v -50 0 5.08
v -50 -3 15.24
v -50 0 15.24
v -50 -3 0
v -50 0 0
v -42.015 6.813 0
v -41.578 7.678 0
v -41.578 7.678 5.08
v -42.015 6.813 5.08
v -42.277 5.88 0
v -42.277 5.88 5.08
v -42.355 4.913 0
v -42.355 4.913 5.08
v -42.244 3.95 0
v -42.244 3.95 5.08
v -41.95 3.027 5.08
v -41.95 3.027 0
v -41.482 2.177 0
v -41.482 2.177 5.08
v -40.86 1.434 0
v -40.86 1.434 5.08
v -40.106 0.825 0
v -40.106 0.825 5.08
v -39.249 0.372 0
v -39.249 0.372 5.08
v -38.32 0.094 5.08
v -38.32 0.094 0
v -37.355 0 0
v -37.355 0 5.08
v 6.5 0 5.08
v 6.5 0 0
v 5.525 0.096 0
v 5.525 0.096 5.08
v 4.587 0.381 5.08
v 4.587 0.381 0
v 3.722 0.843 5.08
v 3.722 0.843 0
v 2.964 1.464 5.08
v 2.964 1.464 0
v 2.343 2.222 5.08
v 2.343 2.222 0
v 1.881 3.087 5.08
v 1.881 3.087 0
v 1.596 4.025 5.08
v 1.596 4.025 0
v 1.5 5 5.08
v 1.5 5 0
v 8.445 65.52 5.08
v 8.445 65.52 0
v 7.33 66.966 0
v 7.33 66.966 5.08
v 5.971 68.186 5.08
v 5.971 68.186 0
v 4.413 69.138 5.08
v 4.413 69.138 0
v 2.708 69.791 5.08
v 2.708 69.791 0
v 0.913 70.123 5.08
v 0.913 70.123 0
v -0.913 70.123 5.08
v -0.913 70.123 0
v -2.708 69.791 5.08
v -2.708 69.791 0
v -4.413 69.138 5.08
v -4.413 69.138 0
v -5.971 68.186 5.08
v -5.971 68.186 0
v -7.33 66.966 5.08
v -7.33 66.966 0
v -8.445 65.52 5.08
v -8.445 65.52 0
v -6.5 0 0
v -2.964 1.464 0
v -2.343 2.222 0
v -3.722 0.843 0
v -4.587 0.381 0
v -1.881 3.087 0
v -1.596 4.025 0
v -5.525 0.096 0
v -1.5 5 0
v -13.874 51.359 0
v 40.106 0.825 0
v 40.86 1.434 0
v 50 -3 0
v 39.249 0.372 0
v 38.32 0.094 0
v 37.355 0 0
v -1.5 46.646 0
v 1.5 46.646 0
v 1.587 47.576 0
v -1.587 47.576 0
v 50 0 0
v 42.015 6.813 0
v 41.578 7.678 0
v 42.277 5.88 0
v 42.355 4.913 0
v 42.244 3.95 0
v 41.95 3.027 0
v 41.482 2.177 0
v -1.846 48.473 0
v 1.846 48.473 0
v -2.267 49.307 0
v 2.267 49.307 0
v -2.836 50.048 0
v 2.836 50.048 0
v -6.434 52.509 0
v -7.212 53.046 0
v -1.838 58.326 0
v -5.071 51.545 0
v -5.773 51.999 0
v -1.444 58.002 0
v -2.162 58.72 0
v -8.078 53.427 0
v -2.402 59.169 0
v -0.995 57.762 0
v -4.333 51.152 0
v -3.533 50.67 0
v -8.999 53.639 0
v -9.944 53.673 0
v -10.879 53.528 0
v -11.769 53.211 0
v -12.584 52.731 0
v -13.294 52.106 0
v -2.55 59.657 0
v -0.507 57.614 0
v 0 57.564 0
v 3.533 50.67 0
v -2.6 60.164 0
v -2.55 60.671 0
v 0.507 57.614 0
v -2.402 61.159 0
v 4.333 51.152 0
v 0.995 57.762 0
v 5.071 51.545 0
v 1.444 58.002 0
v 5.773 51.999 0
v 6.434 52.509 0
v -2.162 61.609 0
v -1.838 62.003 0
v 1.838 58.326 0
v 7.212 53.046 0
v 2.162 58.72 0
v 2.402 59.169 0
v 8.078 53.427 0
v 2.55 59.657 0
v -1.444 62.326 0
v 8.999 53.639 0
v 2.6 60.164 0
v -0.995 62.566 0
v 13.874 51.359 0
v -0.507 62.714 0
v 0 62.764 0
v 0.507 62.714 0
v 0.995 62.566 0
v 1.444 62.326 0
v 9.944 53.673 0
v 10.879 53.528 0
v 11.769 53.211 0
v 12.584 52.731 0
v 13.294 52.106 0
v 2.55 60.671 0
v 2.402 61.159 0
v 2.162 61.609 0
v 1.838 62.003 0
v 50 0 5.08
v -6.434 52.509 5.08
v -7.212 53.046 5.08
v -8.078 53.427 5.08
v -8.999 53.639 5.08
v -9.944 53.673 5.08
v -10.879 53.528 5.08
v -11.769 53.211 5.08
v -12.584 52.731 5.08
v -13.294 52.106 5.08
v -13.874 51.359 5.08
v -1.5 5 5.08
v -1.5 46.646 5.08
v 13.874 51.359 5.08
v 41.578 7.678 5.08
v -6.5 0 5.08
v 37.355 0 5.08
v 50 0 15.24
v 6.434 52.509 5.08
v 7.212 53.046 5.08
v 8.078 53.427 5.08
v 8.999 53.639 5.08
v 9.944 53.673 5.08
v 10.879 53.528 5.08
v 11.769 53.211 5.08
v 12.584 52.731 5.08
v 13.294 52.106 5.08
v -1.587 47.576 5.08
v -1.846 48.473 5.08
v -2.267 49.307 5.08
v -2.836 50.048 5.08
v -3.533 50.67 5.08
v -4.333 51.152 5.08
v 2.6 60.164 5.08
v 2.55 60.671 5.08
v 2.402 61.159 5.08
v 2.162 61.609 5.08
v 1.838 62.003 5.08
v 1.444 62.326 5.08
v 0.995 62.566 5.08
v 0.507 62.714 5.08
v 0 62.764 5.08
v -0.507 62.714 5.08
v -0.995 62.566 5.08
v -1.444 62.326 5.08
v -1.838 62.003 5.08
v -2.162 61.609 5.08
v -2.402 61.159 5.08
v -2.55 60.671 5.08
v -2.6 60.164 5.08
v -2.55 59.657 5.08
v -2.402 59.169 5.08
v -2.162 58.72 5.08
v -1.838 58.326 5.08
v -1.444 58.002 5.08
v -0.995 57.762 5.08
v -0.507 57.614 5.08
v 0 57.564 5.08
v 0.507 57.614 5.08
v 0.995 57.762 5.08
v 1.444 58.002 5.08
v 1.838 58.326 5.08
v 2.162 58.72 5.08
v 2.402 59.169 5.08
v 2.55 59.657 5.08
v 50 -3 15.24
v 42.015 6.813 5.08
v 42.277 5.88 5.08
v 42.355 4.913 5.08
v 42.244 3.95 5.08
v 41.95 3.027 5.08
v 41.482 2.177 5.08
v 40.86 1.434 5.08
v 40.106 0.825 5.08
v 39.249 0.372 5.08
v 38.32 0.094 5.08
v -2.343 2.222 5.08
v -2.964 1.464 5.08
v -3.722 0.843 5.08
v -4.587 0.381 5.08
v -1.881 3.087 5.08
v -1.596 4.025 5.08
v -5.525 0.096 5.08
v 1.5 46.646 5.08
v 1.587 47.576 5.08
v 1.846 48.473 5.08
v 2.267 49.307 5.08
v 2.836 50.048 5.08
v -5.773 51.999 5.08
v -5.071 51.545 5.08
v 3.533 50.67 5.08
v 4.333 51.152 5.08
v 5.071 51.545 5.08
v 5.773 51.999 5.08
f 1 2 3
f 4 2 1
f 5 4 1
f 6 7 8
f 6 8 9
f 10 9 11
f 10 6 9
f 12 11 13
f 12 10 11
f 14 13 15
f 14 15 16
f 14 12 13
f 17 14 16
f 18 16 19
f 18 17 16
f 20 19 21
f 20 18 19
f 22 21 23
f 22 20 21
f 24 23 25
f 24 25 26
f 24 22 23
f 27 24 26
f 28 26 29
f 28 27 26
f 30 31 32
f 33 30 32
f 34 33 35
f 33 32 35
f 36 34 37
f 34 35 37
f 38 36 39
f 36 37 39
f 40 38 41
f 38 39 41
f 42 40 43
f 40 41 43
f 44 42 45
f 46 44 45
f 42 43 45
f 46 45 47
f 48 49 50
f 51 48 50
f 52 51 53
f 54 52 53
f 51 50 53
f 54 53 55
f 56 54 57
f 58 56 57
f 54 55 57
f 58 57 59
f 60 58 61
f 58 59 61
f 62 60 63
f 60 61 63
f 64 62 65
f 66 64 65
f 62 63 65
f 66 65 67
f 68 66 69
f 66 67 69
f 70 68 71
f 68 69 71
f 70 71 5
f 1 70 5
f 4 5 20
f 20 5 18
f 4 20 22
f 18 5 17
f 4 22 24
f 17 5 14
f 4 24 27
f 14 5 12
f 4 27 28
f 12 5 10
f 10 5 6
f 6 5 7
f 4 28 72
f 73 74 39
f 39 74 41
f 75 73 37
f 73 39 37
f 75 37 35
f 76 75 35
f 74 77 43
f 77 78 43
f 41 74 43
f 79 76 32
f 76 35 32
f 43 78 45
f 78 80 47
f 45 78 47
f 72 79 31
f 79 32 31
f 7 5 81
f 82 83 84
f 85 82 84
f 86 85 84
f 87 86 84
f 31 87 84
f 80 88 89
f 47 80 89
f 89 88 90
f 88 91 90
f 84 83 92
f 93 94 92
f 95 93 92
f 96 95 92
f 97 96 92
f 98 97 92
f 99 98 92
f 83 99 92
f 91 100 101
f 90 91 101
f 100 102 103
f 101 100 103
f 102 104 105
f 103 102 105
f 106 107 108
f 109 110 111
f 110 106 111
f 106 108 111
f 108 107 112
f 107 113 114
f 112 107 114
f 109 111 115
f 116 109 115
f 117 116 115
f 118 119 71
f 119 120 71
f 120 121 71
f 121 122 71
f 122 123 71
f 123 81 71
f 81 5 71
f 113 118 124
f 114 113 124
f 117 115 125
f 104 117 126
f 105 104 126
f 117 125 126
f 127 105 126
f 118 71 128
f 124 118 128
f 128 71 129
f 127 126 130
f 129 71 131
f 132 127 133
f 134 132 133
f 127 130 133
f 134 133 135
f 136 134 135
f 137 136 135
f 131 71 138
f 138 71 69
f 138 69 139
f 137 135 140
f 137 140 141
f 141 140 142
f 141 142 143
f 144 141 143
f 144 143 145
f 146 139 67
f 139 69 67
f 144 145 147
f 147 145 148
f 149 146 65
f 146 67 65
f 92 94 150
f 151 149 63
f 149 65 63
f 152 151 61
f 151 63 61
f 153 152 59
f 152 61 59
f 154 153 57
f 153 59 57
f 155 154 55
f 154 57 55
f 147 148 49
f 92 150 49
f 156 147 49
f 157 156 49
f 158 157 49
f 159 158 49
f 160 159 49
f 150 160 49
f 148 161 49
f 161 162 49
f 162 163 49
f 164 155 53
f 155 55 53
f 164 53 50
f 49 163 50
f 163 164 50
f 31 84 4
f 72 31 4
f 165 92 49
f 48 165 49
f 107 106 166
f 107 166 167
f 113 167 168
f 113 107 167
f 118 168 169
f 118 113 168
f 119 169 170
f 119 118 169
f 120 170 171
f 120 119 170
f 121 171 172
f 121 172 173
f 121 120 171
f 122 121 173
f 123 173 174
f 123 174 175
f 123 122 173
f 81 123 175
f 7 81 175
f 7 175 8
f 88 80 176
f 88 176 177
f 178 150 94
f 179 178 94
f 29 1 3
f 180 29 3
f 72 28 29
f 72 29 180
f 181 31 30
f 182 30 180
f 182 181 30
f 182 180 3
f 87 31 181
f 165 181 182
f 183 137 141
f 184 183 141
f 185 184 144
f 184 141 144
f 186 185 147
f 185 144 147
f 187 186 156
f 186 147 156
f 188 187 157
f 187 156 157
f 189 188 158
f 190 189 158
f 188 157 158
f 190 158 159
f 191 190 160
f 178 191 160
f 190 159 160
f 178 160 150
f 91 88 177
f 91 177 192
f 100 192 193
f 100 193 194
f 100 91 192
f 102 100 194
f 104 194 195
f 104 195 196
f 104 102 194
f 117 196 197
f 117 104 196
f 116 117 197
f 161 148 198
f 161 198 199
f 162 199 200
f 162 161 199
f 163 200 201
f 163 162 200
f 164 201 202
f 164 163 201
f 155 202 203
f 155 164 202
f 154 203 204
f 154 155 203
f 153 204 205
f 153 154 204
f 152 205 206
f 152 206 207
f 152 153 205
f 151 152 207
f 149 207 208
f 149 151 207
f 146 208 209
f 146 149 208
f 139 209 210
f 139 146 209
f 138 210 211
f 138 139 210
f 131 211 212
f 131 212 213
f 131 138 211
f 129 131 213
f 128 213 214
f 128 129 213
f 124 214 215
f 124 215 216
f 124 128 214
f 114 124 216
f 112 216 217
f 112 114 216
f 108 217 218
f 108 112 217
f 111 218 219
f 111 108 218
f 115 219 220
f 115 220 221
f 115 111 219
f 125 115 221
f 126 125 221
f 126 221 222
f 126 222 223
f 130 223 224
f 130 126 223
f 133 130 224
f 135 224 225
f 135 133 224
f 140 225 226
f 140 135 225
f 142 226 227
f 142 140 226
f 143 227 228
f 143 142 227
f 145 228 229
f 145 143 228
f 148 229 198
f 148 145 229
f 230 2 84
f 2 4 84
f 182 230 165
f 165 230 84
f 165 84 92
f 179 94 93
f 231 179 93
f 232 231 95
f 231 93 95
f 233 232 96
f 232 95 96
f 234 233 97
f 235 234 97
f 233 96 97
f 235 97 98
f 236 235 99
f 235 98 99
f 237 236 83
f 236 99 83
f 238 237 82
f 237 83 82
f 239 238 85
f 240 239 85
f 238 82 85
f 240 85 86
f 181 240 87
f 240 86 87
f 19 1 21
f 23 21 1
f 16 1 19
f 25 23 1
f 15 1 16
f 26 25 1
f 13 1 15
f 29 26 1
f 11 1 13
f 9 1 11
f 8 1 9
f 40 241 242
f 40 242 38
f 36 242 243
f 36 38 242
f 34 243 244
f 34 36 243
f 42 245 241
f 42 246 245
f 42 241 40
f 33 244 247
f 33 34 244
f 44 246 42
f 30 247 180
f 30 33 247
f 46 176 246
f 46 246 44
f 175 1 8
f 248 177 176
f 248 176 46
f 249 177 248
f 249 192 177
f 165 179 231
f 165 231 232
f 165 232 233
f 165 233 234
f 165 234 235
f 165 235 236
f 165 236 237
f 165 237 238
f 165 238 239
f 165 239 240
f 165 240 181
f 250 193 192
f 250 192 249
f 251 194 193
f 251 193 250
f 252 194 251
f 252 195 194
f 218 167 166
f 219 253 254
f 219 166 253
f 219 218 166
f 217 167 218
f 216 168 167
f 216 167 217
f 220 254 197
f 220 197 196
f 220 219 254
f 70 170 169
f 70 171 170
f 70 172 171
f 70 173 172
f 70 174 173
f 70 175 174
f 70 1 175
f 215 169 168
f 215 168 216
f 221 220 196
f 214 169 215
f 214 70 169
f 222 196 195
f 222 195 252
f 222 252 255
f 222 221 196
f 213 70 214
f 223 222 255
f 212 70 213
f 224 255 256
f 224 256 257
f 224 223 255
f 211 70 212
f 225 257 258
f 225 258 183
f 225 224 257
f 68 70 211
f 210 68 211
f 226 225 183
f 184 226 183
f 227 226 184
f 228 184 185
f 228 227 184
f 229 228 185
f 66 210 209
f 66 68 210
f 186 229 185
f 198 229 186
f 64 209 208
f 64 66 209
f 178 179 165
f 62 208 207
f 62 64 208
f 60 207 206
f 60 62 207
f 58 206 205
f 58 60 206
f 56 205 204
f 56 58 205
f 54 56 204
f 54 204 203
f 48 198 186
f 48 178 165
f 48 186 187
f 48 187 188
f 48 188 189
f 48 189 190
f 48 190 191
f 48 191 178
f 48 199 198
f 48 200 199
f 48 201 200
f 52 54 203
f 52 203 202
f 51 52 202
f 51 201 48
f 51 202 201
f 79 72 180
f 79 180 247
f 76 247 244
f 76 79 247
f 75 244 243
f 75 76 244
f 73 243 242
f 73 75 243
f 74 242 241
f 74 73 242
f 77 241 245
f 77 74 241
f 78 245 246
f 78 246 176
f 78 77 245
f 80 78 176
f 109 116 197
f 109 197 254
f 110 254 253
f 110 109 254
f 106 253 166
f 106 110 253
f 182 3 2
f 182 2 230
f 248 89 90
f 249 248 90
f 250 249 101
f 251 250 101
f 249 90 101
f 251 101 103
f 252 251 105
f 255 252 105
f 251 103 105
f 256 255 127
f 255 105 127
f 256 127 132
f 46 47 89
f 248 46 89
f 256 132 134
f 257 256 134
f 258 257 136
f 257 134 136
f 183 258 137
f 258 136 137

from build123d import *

# Parameters (mm, degrees)
SKETCH2_R           = 2.6
BOSS_EXTRUDE1_DEPTH = 5.08
SKETCH3_W           = 100
SKETCH3_H           = 3
BOSS_EXTRUDE2_DEPTH = 10.16


with BuildPart() as part:
    # Sketch2 → Boss-Extrude1 (new body)
    with BuildSketch(Plane.XY):
        with BuildLine():
            Line((-50, -3), (50, -3))
            Line((50, -3), (50, 0))
            Line((50, 0), (8.444744964, 65.520221164))
            ThreePointArc((8.444744964, 65.520221164), (0, 70.1642635), (-8.444744964, 65.520221164))
            Line((-8.444744964, 65.520221164), (-50, 0))
            Line((-50, 0), (-50, -3))
        make_face()
        with Locations((0, 60.1642635)):
            Circle(SKETCH2_R, mode=Mode.SUBTRACT)
        with BuildLine():
            Line((-13.873524959, 51.359417946), (-41.57784754, 7.677978832))
            ThreePointArc((-41.57784754, 7.677978832), (-41.736678897, 2.590632257), (-37.355475058, 0))
            Line((-37.355475058, 0), (-6.5, 0))
            ThreePointArc((-6.5, 0), (-2.964466094, 1.464466094), (-1.5, 5))
            Line((-1.5, 5), (-1.5, 46.645757665))
            ThreePointArc((-1.5, 46.645757665), (-2.267191634, 49.307210903), (-4.333333333, 51.151926277))
            ThreePointArc((-4.333333333, 51.151926277), (-5.426311672, 51.764552693), (-6.434101651, 52.509047243))
            ThreePointArc((-6.434101651, 52.509047243), (-10.41474909, 53.62278713), (-13.873524959, 51.359417946))
        make_face(mode=Mode.SUBTRACT)
        with BuildLine():
            Line((13.873524959, 51.359417946), (41.57784754, 7.677978832))
            ThreePointArc((41.57784754, 7.677978832), (41.736678897, 2.590632257), (37.355475058, 0))
            Line((37.355475058, 0), (6.5, 0))
            ThreePointArc((6.5, 0), (2.964466094, 1.464466094), (1.5, 5))
            Line((1.5, 5), (1.5, 46.645757665))
            ThreePointArc((1.5, 46.645757665), (2.267191634, 49.307210903), (4.333333333, 51.151926277))
            ThreePointArc((4.333333333, 51.151926277), (5.426311672, 51.764552693), (6.434101651, 52.509047243))
            ThreePointArc((6.434101651, 52.509047243), (10.41474909, 53.62278713), (13.873524959, 51.359417946))
        make_face(mode=Mode.SUBTRACT)
    extrude(amount=BOSS_EXTRUDE1_DEPTH)

    # Sketch3 → Boss-Extrude2 (add)
    with BuildSketch(Plane.XY.offset(5.08)):
        with Locations((0, -1.5)):
            Rectangle(SKETCH3_W, SKETCH3_H)
    extrude(amount=BOSS_EXTRUDE2_DEPTH)


solid = part.part
